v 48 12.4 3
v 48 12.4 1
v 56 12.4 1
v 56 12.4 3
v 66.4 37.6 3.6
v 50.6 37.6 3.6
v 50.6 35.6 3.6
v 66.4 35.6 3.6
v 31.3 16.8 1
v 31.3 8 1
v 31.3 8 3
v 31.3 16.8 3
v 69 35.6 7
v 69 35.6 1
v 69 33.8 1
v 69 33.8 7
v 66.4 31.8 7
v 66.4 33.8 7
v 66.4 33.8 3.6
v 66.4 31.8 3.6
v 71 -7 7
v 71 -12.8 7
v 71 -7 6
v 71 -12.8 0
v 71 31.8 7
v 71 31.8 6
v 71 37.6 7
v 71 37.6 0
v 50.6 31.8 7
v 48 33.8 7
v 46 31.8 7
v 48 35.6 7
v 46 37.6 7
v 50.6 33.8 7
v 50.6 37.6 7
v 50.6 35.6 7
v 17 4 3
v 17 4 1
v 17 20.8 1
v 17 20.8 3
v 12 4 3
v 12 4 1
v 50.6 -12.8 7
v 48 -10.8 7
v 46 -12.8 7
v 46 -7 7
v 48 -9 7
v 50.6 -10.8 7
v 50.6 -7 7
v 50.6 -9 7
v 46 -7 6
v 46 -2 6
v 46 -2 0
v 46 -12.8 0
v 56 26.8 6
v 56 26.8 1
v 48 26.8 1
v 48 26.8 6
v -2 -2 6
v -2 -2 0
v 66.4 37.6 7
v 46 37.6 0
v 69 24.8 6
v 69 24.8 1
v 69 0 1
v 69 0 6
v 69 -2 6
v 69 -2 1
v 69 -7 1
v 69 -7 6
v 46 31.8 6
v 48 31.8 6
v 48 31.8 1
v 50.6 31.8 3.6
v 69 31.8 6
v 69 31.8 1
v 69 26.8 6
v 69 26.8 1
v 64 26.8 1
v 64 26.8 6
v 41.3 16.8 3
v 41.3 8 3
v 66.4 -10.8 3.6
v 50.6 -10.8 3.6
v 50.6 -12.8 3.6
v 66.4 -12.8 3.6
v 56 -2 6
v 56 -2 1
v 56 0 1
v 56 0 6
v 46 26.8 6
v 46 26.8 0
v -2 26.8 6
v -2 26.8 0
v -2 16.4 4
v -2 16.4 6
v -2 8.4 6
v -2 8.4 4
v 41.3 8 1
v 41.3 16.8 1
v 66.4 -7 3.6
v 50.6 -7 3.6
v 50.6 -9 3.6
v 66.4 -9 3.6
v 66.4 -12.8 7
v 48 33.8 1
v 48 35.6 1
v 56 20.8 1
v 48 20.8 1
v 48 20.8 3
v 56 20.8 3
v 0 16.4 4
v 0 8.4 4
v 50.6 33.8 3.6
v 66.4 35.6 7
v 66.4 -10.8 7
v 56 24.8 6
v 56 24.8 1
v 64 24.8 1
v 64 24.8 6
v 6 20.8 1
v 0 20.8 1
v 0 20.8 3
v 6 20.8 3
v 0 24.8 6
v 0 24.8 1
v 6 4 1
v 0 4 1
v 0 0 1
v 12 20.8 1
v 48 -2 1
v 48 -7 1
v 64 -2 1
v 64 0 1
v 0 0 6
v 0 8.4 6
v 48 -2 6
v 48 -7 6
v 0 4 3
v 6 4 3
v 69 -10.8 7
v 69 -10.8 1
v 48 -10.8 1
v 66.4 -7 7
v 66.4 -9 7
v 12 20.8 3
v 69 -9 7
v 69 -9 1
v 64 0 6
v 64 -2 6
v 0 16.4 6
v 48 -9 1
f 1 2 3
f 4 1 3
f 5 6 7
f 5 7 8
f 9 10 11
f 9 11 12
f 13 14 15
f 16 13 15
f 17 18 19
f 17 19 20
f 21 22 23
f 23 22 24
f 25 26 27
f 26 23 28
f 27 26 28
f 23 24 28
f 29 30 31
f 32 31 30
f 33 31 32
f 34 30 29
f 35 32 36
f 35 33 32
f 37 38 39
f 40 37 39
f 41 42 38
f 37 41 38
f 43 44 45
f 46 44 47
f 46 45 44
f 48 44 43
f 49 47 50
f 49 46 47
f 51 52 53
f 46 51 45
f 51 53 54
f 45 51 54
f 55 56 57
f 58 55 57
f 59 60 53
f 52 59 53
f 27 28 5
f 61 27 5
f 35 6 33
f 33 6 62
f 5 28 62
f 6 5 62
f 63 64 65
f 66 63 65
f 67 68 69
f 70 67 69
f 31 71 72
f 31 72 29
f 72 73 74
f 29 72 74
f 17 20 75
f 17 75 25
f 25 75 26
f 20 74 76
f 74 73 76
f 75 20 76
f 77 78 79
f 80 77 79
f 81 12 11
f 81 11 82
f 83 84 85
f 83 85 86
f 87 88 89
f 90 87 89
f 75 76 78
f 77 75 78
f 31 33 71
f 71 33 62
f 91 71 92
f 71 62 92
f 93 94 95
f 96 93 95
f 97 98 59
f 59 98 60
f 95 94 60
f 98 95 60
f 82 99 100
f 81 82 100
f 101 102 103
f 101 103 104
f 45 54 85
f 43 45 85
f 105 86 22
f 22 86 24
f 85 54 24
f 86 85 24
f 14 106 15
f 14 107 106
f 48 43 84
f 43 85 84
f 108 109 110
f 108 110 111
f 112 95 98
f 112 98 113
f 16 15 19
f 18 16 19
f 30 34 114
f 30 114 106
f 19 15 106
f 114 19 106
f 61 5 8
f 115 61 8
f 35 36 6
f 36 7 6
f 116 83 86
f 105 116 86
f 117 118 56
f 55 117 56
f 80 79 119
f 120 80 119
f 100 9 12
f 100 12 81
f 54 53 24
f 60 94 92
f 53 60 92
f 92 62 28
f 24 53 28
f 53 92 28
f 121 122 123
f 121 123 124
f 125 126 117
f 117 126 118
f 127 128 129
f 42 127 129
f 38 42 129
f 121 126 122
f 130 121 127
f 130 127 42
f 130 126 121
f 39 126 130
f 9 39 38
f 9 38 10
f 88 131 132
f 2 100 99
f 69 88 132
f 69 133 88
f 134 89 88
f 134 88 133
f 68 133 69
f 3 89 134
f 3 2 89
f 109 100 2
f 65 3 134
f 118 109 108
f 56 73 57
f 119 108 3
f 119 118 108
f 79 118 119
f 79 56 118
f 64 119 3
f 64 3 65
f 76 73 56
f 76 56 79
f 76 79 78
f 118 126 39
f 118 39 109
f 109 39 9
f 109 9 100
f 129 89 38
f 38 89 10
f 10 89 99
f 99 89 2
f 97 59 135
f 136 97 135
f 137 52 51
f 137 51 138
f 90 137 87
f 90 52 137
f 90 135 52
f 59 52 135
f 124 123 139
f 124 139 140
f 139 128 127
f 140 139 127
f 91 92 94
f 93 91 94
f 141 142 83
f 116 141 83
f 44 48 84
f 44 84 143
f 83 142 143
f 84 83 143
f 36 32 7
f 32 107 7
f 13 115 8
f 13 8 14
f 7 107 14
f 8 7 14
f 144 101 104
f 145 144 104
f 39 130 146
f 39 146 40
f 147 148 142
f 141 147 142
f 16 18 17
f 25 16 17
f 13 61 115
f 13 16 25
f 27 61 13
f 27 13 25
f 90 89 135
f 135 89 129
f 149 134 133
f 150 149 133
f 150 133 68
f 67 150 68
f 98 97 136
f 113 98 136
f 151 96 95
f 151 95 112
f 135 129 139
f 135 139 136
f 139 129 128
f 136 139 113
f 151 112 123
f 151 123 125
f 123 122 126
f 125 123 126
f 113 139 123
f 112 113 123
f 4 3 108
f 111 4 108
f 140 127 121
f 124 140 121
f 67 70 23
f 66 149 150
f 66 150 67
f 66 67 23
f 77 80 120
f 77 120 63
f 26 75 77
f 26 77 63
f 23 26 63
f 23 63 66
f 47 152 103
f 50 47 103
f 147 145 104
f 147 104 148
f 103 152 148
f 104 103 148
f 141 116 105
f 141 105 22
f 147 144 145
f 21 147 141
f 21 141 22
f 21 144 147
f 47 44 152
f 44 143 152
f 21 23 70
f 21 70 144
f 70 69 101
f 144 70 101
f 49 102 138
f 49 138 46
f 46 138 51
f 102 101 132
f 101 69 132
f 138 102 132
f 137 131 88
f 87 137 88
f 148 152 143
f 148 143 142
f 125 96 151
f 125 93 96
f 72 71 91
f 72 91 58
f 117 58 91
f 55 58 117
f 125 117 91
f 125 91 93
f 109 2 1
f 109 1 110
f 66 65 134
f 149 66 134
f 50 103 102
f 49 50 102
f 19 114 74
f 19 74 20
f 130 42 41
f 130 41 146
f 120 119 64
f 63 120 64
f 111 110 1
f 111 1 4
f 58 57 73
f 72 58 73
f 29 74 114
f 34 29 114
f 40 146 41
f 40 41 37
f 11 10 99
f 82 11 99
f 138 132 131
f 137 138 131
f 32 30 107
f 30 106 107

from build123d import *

# Parameters (mm, degrees)
F0_W      = 6
F0_H      = 16.8
F1_DEPTH  = 3
F0_W_2    = 5
F0_W_3    = 10
F0_H_2    = 8.8
F0_W_4    = 8
F0_H_3    = 8.4
F2_DEPTH  = 6
F0_W_5    = 15.8
F0_H_4    = 2
F3_DEPTH  = 3.6
F4_DEPTH  = 1
F7_DEPTH  = 1
F8_DEPTH  = 1
F9_W      = 2
F9_H      = 8
F10_DEPTH = 2


# Not quite as in the source:
# - a feature names something its author has since deleted; it is built from what else it names


with BuildPart() as f1:
    # F0 (on Top) → F1 (new body)
    with BuildSketch(Plane.XY):
        with Locations((3, 12.4)):
            Rectangle(F0_W, F0_H)
    extrude(amount=F1_DEPTH)

    # F0 (on Top) → F2 (join)
    with BuildSketch(Plane.XY):
        Polygon((0, 4), (0, 20.8), (0, 24.8), (56, 24.8), (56, 26.8), (48, 26.8), (48, 31.8), (50.6, 31.8), (50.6, 33.8), (48, 33.8), (48, 35.6), (50.6, 35.6), (50.6, 37.6), (46, 37.6), (46, 26.8), (-2, 26.8), (-2, -2), (46, -2), (46, -12.8), (50.6, -12.8), (50.6, -10.8), (48, -10.8), (48, -9), (50.6, -9), (50.6, -7), (48, -7), (48, -2), (56, -2), (56, 0), (0, 0), align=None)
    extrude(amount=F2_DEPTH)



with BuildPart() as f1b:
    # F0 (on Top) → F1, piece 2 (new body)
    with BuildSketch(Plane.XY):
        with Locations((14.5, 12.4)):
            Rectangle(F0_W_2, F0_H)
    extrude(amount=F1_DEPTH)


with BuildPart() as f1c:
    # F0 (on Top) → F1, piece 3 (new body)
    with BuildSketch(Plane.XY):
        with Locations((36.3, 12.4)):
            Rectangle(F0_W_3, F0_H_2)
    extrude(amount=F1_DEPTH)


with BuildPart() as f1d:
    # F0 (on Top) → F1, piece 4 (new body)
    with BuildSketch(Plane.XY):
        with Locations((52, 16.6)):
            Rectangle(F0_W_4, F0_H_3)
    extrude(amount=F1_DEPTH)


with BuildPart() as f2:
    # F0 (on Top) → F2, piece 2 (new body)
    with BuildSketch(Plane.XY):
        Polygon((66.4, 33.8), (66.4, 31.8), (69, 31.8), (69, 26.8), (64, 26.8), (64, 24.8), (69, 24.8), (69, 0), (64, 0), (64, -2), (69, -2), (69, -7), (66.4, -7), (66.4, -9), (69, -9), (69, -10.8), (66.4, -10.8), (66.4, -12.8), (71, -12.8), (71, 37.6), (66.4, 37.6), (66.4, 35.6), (69, 35.6), (69, 33.8), align=None)
    extrude(amount=F2_DEPTH)


with BuildPart() as f1_1:
    add(f1.part)

    add(f2.part)  # F3 merges F2
    # F0 (on Top) → F3 (join)
    with BuildSketch(Plane.XY):
        with Locations((58.5, 36.6)):
            Rectangle(F0_W_5, F0_H_4)
        with Locations((58.5, 32.8)):
            Rectangle(F0_W_5, F0_H_4)
        with Locations((58.5, -8)):
            Rectangle(F0_W_5, F0_H_4)
        with Locations((58.5, -11.8)):
            Rectangle(F0_W_5, F0_H_4)
    extrude(amount=F3_DEPTH)

    # F0 (on Top) → F4 (join)
    with BuildSketch(Plane.XY):
        Polygon((48, 33.8), (50.6, 33.8), (66.4, 33.8), (69, 33.8), (69, 35.6), (66.4, 35.6), (50.6, 35.6), (48, 35.6), align=None)
        Polygon((66.4, -9), (50.6, -9), (48, -9), (48, -10.8), (50.6, -10.8), (66.4, -10.8), (69, -10.8), (69, -9), align=None)
    extrude(amount=F4_DEPTH)

    # F5 (on face) + F6 (on face) → F7 (join)
    with BuildSketch(Plane.XY.offset(6)):
        Polygon((48, 31.8), (50.6, 31.8), (50.6, 33.8), (48, 33.8), (48, 35.6), (50.6, 35.6), (50.6, 37.6), (46, 37.6), (46, 31.8), align=None)
        Polygon((48, -7), (46, -7), (46, -12.8), (50.6, -12.8), (50.6, -10.8), (48, -10.8), (48, -9), (50.6, -9), (50.6, -7), align=None)
    with BuildSketch(Plane.XY.offset(6)):
        Polygon((66.4, 33.8), (66.4, 31.8), (69, 31.8), (71, 31.8), (71, 37.6), (66.4, 37.6), (66.4, 35.6), (69, 35.6), (69, 33.8), align=None)
        Polygon((71, -12.8), (71, -7), (69, -7), (66.4, -7), (66.4, -9), (69, -9), (69, -10.8), (66.4, -10.8), (66.4, -12.8), align=None)
    extrude(amount=F7_DEPTH)


    add(f1b.part)  # F8 merges F1b

    add(f1c.part)  # F8 merges F1c

    add(f1d.part)  # F8 merges F1d
    # F0 (on Top) → F8 (join)
    with BuildSketch(Plane.XY):
        Polygon((0, 4), (0, 20.8), (0, 24.8), (56, 24.8), (56, 26.8), (48, 26.8), (48, 31.8), (50.6, 31.8), (50.6, 33.8), (48, 33.8), (48, 35.6), (50.6, 35.6), (50.6, 37.6), (46, 37.6), (46, 26.8), (-2, 26.8), (-2, -2), (46, -2), (46, -12.8), (50.6, -12.8), (50.6, -10.8), (48, -10.8), (48, -9), (50.6, -9), (50.6, -7), (48, -7), (48, -2), (56, -2), (56, 0), (0, 0), align=None)
        Polygon((66.4, 33.8), (66.4, 31.8), (69, 31.8), (69, 26.8), (64, 26.8), (64, 24.8), (69, 24.8), (69, 0), (64, 0), (64, -2), (69, -2), (69, -7), (66.4, -7), (66.4, -9), (69, -9), (69, -10.8), (66.4, -10.8), (66.4, -12.8), (71, -12.8), (71, 37.6), (66.4, 37.6), (66.4, 35.6), (69, 35.6), (69, 33.8), align=None)
        with Locations((58.5, 36.6)):
            Rectangle(F0_W_5, F0_H_4)
        with Locations((58.5, -11.8)):
            Rectangle(F0_W_5, F0_H_4)
        Polygon((0, 24.8), (0, 20.8), (6, 20.8), (6, 4), (0, 4), (0, 0), (56, 0), (56, -2), (48, -2), (48, -7), (50.6, -7), (66.4, -7), (69, -7), (69, -2), (64, -2), (64, 0), (69, 0), (69, 24.8), (64, 24.8), (64, 26.8), (69, 26.8), (69, 31.8), (66.4, 31.8), (50.6, 31.8), (48, 31.8), (48, 26.8), (56, 26.8), (56, 24.8), align=None)
        with Locations((14.5, 12.4)):
            Rectangle(F0_W_2, F0_H, mode=Mode.SUBTRACT)
        with Locations((36.3, 12.4)):
            Rectangle(F0_W_3, F0_H_2, mode=Mode.SUBTRACT)
        with Locations((52, 16.6)):
            Rectangle(F0_W_4, F0_H_3, mode=Mode.SUBTRACT)
    extrude(amount=F8_DEPTH)

    # F9 (on face) → F10 (cut)
    with BuildSketch(Plane.XY.offset(6)):
        with Locations((-1, 12.4)):
            Rectangle(F9_W, F9_H)
    extrude(amount=-F10_DEPTH, mode=Mode.SUBTRACT)


solid = f1_1.part
